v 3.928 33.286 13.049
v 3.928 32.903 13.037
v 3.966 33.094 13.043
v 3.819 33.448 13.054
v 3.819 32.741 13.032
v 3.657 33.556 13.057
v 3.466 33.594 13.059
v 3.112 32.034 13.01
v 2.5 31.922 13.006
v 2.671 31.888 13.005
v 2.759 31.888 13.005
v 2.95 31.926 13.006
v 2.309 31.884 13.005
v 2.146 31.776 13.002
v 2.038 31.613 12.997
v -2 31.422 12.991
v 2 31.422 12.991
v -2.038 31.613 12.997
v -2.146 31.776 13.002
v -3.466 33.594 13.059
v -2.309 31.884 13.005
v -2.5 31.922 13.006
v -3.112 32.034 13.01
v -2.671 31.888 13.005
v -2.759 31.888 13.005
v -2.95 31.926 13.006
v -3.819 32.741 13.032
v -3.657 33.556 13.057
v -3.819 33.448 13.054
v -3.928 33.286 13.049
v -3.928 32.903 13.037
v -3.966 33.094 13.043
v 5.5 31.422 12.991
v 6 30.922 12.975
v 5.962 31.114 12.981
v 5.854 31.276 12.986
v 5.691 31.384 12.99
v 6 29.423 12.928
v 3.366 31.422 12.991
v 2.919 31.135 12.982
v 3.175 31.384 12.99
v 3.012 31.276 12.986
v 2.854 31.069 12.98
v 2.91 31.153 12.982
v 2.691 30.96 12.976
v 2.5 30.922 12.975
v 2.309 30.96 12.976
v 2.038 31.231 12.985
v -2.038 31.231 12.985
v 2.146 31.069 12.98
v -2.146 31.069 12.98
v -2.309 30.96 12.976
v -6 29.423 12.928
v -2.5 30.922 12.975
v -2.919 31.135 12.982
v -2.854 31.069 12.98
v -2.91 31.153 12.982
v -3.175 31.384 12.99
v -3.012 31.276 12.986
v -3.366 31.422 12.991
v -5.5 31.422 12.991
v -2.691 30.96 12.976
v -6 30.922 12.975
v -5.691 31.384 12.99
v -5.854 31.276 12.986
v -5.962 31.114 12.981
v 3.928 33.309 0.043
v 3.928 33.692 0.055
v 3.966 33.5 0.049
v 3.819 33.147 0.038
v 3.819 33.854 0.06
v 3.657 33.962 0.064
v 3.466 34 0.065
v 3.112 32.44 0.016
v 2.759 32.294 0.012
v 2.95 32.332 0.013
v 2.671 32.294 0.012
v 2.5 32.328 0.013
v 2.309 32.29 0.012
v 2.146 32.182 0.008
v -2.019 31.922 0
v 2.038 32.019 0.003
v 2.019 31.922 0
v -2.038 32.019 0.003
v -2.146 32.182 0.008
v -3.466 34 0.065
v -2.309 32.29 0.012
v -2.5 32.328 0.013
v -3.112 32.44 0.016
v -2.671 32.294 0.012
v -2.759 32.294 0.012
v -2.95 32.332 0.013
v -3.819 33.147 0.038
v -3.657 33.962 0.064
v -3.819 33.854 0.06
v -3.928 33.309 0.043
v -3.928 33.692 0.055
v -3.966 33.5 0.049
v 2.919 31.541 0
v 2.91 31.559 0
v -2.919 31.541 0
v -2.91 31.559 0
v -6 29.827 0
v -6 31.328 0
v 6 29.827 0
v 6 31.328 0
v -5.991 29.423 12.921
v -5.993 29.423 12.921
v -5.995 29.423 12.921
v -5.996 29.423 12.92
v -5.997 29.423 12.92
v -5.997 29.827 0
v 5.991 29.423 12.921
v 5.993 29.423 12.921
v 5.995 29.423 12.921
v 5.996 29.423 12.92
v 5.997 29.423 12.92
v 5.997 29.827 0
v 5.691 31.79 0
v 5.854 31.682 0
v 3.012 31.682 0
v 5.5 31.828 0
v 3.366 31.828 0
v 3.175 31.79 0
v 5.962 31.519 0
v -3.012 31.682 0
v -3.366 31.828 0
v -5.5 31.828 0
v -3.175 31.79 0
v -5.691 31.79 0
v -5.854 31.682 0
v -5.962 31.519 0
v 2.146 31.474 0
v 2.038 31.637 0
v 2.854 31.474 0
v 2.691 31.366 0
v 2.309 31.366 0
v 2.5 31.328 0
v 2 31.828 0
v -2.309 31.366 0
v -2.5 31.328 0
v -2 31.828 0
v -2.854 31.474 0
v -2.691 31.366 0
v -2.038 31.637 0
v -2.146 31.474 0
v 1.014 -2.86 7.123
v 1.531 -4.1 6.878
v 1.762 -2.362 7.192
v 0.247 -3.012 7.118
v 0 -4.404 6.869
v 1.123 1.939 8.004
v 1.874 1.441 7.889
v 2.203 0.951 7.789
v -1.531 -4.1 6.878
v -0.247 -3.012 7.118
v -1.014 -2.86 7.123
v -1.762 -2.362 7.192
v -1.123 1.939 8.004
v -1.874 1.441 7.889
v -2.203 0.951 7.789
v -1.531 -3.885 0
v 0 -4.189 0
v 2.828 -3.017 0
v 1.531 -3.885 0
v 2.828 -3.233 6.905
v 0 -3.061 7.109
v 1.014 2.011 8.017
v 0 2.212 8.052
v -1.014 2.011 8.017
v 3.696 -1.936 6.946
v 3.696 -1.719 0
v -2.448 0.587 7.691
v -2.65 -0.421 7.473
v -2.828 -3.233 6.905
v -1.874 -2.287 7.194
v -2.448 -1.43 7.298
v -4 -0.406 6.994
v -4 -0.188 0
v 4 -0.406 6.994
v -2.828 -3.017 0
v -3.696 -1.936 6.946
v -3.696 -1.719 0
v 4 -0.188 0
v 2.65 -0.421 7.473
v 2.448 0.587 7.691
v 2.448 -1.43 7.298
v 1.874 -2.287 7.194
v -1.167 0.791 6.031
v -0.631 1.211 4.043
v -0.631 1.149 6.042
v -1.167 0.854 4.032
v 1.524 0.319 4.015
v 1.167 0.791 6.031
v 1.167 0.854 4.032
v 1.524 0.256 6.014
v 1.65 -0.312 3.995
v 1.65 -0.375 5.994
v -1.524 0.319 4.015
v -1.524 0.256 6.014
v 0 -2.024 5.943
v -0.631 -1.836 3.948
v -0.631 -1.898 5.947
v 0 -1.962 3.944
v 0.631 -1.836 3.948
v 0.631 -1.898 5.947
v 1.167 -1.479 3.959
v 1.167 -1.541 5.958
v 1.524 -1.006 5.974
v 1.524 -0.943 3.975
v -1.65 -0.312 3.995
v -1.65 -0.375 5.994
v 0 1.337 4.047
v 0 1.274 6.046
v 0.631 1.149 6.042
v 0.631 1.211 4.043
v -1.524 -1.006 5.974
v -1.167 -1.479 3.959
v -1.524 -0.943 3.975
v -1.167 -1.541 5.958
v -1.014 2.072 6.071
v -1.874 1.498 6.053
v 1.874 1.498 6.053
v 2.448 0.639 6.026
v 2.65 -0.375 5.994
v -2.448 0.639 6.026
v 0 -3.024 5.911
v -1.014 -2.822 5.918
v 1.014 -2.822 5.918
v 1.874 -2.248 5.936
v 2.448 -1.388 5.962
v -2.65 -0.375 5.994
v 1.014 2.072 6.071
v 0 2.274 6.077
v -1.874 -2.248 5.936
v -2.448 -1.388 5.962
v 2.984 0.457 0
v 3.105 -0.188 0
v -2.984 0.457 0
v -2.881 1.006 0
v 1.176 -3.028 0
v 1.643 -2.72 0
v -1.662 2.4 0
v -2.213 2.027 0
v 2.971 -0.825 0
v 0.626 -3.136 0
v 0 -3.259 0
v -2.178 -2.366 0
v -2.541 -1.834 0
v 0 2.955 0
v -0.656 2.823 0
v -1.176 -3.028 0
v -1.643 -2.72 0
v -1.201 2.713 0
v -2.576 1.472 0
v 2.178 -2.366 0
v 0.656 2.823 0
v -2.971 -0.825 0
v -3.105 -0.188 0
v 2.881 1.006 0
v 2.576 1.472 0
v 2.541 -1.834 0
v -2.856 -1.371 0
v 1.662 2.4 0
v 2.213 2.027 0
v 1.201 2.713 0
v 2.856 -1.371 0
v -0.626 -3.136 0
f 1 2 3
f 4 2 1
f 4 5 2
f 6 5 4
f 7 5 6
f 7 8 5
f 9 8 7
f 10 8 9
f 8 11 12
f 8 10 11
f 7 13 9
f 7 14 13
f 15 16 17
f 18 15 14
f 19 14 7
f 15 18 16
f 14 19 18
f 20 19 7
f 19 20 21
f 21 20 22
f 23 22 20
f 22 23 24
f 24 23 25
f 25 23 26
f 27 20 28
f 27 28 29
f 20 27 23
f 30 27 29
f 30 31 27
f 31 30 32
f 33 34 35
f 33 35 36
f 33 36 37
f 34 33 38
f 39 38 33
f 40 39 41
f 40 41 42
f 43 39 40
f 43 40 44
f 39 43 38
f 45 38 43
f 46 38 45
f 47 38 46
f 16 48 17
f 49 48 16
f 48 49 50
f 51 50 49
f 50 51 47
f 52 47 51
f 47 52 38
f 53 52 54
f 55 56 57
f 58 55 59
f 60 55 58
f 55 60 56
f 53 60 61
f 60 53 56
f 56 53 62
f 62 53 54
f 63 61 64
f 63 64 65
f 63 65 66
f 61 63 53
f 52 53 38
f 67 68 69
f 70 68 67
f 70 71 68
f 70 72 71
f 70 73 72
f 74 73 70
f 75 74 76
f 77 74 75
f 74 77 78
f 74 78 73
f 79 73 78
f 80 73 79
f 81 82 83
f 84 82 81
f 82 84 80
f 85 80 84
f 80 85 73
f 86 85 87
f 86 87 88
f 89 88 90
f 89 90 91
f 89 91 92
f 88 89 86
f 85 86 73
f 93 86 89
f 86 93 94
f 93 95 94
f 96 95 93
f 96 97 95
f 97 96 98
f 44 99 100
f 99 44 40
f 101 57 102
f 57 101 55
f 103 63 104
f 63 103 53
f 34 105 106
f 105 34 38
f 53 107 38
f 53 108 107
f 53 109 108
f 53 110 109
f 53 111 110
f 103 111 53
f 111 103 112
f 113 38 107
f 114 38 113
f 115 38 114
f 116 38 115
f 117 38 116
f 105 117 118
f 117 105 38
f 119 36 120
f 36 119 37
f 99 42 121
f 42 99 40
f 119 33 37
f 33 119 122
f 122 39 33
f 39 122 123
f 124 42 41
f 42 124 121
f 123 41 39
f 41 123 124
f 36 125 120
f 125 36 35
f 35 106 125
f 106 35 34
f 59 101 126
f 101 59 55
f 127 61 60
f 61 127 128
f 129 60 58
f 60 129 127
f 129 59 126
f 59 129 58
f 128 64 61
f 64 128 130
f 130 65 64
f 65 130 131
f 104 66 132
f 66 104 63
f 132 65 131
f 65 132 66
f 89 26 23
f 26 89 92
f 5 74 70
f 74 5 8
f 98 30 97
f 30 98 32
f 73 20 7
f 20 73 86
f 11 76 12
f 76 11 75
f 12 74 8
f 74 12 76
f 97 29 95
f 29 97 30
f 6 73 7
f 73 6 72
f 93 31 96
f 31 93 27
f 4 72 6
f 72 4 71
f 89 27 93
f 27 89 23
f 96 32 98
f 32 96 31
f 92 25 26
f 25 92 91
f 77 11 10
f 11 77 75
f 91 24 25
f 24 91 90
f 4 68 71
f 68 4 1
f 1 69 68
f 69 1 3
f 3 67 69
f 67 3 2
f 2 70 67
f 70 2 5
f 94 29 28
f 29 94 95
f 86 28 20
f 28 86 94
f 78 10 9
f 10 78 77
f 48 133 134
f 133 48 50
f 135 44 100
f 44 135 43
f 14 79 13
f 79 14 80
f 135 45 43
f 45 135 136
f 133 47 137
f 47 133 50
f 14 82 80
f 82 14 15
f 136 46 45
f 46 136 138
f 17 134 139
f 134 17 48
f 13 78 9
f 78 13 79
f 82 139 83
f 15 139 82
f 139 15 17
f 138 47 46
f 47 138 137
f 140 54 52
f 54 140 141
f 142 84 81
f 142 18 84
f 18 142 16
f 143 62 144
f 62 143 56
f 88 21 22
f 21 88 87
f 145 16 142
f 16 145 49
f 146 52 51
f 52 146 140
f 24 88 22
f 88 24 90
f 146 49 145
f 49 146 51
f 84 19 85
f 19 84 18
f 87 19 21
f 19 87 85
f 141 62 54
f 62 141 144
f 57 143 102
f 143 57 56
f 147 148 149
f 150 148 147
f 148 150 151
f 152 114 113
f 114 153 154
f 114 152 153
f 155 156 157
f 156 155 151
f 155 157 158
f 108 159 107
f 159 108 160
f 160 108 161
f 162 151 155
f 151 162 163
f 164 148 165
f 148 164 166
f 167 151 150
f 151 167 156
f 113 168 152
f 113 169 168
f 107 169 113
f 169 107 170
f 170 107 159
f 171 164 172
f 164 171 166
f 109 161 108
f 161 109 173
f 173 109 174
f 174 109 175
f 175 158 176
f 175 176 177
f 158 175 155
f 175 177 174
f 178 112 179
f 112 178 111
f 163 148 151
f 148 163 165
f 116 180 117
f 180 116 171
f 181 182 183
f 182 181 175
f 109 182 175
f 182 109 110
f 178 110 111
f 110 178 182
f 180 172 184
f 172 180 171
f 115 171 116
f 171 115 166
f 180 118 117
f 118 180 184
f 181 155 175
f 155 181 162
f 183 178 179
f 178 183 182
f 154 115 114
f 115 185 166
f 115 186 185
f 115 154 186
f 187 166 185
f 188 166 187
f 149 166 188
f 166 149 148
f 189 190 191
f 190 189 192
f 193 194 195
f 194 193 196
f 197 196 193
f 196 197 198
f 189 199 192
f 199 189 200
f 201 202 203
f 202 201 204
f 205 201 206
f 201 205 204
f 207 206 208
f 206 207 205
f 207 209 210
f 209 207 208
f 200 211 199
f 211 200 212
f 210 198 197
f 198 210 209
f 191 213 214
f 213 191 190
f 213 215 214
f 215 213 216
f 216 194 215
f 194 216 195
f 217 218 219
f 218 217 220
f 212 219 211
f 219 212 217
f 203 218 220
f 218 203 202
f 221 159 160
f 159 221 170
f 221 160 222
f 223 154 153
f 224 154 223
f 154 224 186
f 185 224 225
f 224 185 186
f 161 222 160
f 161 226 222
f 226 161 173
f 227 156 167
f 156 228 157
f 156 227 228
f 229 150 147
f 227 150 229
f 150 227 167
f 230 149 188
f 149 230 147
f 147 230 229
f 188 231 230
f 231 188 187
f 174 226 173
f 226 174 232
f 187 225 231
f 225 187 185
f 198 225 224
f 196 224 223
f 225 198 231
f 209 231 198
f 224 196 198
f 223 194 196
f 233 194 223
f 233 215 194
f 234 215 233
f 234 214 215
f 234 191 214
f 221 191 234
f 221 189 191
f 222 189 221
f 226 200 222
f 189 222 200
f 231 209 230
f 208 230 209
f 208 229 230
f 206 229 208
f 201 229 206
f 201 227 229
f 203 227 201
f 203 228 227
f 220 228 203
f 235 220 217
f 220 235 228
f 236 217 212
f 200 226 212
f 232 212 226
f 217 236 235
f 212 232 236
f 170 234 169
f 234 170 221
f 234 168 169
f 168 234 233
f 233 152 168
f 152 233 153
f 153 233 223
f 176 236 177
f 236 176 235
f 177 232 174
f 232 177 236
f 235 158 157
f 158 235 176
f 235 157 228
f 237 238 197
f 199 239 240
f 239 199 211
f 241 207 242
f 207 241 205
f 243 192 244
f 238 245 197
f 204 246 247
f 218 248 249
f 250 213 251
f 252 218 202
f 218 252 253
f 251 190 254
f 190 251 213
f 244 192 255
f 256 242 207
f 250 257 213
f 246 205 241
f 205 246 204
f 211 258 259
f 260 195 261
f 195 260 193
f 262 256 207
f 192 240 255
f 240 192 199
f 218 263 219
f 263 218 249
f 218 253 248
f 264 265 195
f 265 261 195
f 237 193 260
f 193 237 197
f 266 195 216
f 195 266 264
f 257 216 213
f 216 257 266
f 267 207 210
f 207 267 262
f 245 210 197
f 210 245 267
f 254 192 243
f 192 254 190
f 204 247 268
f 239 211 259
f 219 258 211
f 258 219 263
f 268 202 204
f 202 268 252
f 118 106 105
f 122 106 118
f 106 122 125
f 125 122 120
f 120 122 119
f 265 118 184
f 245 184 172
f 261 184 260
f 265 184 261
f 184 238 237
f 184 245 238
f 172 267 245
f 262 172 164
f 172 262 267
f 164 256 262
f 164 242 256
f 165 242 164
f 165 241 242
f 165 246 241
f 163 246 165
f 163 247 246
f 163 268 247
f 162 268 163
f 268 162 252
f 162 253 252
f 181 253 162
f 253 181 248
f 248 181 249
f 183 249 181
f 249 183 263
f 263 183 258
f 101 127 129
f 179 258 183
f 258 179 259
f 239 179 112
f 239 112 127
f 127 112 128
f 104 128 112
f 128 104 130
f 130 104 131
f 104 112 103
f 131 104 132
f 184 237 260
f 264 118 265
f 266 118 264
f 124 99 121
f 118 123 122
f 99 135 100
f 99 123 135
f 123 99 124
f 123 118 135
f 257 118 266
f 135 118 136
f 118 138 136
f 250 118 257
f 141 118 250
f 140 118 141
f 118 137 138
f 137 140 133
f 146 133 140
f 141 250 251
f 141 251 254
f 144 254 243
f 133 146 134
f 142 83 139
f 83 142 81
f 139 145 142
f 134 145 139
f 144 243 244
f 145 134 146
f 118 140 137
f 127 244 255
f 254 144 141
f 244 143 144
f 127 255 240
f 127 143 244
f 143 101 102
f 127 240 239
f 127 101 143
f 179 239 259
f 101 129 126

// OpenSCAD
/******************************************************************
*                                                                 *
* OpenFlexure Microscope: Illumination arm                        *
*                                                                 *
* This is part of the OpenFlexure microscope, an open-source      *
* microscope and 3-axis translation stage.  It gets really good   *
* precision over a ~10mm range, by using plastic flexure          *
* mechanisms.                                                     *
*                                                                 *
* (c) Richard Bowman, January 2016                                *
* Released under the CERN Open Hardware License                   *
*                                                                 *
******************************************************************/

use <utilities.scad>;
$fn=16;
d=0.05;

big_stage = true;

sample_z = big_stage?60:40; //height of the top of the stage
leg_r = big_stage?30:25;
stage_t=5; //thickness of the stage (at thickest point, most is 1mm less)
clip_w = 8; //internal width of clip for dovetail

//the dovetail should sit at ([0,-leg_r-2,sample_z+5])
//the LED should sit at ([0,0,sample_z+30])
module clip_tooth(h){
	intersection(){
		cube([999,999,h]);
		rotate(-45) cube([1,1,1]*999*2);
	}
}
module dovetail(w=10,dt=1.5,h=10,t=2){
	assign(r=0.5,corner=[w/2-dt,0,0]) difference(){
		union(){
			sequential_hull(){
				translate([-w/2+dt,r,0]) cube([w-2*dt,d,h]);
				translate([-w/2+dt-r,-r,0]) cube([w-2*dt+2*r,d,h]);
				translate([-w/2,-r,0]) cube([w,d,h]);
				translate([-w/2-t,-t,0]) cube([w+2*t,t-r,h]);
				echo("width of dovetail back is", w-2*dt+2*(sqrt(3)*r+1+r));
			}
			difference(){
				union(){
					reflect([1,0,0]) hull(){
						translate(corner+[sqrt(3)*r,-r,0]) cylinder(r=r,h=h);	
						translate([w/2+t-r,-r,0]) cylinder(r=r,h=h);	
				}
					hull() reflect([1,0,0]) translate(corner) rotate(45) translate([sqrt(3)*r,r,0]) repeat([1,0,0],2) cylinder(r=r,h=h);
				}
			}
		}
		reflect([1,0,0]) translate(corner) cylinder(r=r,h=3*h,center=true);
		reflect([1,0,0]) translate(corner+[0,0,-1]) clip_tooth(999);
	}
}

led_z = 12;
dt_h = 13;
below_led = 6;
led_r = 3/2*1.1;
led_angle = 20;

intersection(){
	cylinder(r=999,h=999,$fn=8);
//rotate([atan(25/(leg_r+3)),0,0])
	translate([0,0,-led_z+below_led]) //rotate([atan((25+3-14)/(leg_r)),180,0])
    rotate(atan((led_z-below_led-5)/(leg_r+2)),[1,0,0])
    difference(){
		union(){
			translate([0,leg_r+2,5]) dovetail(w=clip_w,h=dt_h);
			hull(){
				translate([-clip_w/2-2,leg_r+d,5]) cube([clip_w+2*2,d,dt_h]);
				translate([0,0,led_z-below_led]) cylinder(r=4,h=below_led+1);
			}
		}
		#translate([0,0,led_z-4]) cylinder(r=led_r,h=5);
		translate([0,0,led_z]) cylinder(r=led_r+1,h=999);
		translate([0,0,led_z-30-2]) cylinder(r1=led_r+30*tan(led_angle),r2=led_r,h=30);
	}
}
